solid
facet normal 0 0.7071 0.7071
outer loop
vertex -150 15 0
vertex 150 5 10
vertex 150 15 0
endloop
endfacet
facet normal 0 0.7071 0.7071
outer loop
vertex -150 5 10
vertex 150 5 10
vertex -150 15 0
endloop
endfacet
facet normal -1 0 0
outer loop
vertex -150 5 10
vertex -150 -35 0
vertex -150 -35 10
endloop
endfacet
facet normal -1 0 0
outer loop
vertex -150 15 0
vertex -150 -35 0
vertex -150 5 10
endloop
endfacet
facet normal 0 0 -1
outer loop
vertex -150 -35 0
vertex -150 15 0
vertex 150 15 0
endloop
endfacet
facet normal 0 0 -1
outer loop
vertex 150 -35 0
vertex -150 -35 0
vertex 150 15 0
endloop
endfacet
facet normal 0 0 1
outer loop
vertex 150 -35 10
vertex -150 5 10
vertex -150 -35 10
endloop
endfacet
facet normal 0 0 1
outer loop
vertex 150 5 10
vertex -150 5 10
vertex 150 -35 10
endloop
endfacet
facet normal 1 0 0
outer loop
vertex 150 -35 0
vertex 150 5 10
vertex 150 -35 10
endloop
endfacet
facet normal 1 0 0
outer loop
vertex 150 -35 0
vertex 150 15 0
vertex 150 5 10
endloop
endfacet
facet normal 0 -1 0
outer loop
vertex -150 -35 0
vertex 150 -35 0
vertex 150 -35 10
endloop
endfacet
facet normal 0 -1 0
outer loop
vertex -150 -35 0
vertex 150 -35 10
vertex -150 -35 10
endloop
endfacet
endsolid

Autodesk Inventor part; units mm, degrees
ref_plane "YZ Plane" through (0, 0, 0) normal (1, 0, 0) x (0, 1, 0)
ref_plane "XZ Plane" through (0, 0, 0) normal (0, 1, 0) x (-1, 0, 0)
ref_plane "XY Plane" through (0, 0, 0) normal (0, 0, 1) x (1, 0, 0)
sketch "Sketch1" plane through (0, 0, 0) normal (0, 0, 1) x (1, 0, 0)
  line L0 (150, -15) -> (-150, -15)
  line L1 (-150, -15) -> (-150, 15)
  line L2 (-150, 15) -> (150, 15)
  line L3 (150, 15) -> (150, -15)
  line L4 (150, -15) -> (-150, 15) construction
  line L5 (-150, -15) -> (150, 15) construction
  point P0 (0, 0)
  dimension "d0" = 300
  dimension "d1" = 30
extrude "Extrusion1" add sketch "Sketch1" along normal blind 10
chamfer "Chamfer1" distance 10 angle 45 1 edges at (0, 15, 10)
thicken "Thicken1" operation add thickness 20 both sides no extend neighbours yes toward (0, -1, 0) faces at (-50, -15, 3.3333)
properties part number "ball_ramp"
